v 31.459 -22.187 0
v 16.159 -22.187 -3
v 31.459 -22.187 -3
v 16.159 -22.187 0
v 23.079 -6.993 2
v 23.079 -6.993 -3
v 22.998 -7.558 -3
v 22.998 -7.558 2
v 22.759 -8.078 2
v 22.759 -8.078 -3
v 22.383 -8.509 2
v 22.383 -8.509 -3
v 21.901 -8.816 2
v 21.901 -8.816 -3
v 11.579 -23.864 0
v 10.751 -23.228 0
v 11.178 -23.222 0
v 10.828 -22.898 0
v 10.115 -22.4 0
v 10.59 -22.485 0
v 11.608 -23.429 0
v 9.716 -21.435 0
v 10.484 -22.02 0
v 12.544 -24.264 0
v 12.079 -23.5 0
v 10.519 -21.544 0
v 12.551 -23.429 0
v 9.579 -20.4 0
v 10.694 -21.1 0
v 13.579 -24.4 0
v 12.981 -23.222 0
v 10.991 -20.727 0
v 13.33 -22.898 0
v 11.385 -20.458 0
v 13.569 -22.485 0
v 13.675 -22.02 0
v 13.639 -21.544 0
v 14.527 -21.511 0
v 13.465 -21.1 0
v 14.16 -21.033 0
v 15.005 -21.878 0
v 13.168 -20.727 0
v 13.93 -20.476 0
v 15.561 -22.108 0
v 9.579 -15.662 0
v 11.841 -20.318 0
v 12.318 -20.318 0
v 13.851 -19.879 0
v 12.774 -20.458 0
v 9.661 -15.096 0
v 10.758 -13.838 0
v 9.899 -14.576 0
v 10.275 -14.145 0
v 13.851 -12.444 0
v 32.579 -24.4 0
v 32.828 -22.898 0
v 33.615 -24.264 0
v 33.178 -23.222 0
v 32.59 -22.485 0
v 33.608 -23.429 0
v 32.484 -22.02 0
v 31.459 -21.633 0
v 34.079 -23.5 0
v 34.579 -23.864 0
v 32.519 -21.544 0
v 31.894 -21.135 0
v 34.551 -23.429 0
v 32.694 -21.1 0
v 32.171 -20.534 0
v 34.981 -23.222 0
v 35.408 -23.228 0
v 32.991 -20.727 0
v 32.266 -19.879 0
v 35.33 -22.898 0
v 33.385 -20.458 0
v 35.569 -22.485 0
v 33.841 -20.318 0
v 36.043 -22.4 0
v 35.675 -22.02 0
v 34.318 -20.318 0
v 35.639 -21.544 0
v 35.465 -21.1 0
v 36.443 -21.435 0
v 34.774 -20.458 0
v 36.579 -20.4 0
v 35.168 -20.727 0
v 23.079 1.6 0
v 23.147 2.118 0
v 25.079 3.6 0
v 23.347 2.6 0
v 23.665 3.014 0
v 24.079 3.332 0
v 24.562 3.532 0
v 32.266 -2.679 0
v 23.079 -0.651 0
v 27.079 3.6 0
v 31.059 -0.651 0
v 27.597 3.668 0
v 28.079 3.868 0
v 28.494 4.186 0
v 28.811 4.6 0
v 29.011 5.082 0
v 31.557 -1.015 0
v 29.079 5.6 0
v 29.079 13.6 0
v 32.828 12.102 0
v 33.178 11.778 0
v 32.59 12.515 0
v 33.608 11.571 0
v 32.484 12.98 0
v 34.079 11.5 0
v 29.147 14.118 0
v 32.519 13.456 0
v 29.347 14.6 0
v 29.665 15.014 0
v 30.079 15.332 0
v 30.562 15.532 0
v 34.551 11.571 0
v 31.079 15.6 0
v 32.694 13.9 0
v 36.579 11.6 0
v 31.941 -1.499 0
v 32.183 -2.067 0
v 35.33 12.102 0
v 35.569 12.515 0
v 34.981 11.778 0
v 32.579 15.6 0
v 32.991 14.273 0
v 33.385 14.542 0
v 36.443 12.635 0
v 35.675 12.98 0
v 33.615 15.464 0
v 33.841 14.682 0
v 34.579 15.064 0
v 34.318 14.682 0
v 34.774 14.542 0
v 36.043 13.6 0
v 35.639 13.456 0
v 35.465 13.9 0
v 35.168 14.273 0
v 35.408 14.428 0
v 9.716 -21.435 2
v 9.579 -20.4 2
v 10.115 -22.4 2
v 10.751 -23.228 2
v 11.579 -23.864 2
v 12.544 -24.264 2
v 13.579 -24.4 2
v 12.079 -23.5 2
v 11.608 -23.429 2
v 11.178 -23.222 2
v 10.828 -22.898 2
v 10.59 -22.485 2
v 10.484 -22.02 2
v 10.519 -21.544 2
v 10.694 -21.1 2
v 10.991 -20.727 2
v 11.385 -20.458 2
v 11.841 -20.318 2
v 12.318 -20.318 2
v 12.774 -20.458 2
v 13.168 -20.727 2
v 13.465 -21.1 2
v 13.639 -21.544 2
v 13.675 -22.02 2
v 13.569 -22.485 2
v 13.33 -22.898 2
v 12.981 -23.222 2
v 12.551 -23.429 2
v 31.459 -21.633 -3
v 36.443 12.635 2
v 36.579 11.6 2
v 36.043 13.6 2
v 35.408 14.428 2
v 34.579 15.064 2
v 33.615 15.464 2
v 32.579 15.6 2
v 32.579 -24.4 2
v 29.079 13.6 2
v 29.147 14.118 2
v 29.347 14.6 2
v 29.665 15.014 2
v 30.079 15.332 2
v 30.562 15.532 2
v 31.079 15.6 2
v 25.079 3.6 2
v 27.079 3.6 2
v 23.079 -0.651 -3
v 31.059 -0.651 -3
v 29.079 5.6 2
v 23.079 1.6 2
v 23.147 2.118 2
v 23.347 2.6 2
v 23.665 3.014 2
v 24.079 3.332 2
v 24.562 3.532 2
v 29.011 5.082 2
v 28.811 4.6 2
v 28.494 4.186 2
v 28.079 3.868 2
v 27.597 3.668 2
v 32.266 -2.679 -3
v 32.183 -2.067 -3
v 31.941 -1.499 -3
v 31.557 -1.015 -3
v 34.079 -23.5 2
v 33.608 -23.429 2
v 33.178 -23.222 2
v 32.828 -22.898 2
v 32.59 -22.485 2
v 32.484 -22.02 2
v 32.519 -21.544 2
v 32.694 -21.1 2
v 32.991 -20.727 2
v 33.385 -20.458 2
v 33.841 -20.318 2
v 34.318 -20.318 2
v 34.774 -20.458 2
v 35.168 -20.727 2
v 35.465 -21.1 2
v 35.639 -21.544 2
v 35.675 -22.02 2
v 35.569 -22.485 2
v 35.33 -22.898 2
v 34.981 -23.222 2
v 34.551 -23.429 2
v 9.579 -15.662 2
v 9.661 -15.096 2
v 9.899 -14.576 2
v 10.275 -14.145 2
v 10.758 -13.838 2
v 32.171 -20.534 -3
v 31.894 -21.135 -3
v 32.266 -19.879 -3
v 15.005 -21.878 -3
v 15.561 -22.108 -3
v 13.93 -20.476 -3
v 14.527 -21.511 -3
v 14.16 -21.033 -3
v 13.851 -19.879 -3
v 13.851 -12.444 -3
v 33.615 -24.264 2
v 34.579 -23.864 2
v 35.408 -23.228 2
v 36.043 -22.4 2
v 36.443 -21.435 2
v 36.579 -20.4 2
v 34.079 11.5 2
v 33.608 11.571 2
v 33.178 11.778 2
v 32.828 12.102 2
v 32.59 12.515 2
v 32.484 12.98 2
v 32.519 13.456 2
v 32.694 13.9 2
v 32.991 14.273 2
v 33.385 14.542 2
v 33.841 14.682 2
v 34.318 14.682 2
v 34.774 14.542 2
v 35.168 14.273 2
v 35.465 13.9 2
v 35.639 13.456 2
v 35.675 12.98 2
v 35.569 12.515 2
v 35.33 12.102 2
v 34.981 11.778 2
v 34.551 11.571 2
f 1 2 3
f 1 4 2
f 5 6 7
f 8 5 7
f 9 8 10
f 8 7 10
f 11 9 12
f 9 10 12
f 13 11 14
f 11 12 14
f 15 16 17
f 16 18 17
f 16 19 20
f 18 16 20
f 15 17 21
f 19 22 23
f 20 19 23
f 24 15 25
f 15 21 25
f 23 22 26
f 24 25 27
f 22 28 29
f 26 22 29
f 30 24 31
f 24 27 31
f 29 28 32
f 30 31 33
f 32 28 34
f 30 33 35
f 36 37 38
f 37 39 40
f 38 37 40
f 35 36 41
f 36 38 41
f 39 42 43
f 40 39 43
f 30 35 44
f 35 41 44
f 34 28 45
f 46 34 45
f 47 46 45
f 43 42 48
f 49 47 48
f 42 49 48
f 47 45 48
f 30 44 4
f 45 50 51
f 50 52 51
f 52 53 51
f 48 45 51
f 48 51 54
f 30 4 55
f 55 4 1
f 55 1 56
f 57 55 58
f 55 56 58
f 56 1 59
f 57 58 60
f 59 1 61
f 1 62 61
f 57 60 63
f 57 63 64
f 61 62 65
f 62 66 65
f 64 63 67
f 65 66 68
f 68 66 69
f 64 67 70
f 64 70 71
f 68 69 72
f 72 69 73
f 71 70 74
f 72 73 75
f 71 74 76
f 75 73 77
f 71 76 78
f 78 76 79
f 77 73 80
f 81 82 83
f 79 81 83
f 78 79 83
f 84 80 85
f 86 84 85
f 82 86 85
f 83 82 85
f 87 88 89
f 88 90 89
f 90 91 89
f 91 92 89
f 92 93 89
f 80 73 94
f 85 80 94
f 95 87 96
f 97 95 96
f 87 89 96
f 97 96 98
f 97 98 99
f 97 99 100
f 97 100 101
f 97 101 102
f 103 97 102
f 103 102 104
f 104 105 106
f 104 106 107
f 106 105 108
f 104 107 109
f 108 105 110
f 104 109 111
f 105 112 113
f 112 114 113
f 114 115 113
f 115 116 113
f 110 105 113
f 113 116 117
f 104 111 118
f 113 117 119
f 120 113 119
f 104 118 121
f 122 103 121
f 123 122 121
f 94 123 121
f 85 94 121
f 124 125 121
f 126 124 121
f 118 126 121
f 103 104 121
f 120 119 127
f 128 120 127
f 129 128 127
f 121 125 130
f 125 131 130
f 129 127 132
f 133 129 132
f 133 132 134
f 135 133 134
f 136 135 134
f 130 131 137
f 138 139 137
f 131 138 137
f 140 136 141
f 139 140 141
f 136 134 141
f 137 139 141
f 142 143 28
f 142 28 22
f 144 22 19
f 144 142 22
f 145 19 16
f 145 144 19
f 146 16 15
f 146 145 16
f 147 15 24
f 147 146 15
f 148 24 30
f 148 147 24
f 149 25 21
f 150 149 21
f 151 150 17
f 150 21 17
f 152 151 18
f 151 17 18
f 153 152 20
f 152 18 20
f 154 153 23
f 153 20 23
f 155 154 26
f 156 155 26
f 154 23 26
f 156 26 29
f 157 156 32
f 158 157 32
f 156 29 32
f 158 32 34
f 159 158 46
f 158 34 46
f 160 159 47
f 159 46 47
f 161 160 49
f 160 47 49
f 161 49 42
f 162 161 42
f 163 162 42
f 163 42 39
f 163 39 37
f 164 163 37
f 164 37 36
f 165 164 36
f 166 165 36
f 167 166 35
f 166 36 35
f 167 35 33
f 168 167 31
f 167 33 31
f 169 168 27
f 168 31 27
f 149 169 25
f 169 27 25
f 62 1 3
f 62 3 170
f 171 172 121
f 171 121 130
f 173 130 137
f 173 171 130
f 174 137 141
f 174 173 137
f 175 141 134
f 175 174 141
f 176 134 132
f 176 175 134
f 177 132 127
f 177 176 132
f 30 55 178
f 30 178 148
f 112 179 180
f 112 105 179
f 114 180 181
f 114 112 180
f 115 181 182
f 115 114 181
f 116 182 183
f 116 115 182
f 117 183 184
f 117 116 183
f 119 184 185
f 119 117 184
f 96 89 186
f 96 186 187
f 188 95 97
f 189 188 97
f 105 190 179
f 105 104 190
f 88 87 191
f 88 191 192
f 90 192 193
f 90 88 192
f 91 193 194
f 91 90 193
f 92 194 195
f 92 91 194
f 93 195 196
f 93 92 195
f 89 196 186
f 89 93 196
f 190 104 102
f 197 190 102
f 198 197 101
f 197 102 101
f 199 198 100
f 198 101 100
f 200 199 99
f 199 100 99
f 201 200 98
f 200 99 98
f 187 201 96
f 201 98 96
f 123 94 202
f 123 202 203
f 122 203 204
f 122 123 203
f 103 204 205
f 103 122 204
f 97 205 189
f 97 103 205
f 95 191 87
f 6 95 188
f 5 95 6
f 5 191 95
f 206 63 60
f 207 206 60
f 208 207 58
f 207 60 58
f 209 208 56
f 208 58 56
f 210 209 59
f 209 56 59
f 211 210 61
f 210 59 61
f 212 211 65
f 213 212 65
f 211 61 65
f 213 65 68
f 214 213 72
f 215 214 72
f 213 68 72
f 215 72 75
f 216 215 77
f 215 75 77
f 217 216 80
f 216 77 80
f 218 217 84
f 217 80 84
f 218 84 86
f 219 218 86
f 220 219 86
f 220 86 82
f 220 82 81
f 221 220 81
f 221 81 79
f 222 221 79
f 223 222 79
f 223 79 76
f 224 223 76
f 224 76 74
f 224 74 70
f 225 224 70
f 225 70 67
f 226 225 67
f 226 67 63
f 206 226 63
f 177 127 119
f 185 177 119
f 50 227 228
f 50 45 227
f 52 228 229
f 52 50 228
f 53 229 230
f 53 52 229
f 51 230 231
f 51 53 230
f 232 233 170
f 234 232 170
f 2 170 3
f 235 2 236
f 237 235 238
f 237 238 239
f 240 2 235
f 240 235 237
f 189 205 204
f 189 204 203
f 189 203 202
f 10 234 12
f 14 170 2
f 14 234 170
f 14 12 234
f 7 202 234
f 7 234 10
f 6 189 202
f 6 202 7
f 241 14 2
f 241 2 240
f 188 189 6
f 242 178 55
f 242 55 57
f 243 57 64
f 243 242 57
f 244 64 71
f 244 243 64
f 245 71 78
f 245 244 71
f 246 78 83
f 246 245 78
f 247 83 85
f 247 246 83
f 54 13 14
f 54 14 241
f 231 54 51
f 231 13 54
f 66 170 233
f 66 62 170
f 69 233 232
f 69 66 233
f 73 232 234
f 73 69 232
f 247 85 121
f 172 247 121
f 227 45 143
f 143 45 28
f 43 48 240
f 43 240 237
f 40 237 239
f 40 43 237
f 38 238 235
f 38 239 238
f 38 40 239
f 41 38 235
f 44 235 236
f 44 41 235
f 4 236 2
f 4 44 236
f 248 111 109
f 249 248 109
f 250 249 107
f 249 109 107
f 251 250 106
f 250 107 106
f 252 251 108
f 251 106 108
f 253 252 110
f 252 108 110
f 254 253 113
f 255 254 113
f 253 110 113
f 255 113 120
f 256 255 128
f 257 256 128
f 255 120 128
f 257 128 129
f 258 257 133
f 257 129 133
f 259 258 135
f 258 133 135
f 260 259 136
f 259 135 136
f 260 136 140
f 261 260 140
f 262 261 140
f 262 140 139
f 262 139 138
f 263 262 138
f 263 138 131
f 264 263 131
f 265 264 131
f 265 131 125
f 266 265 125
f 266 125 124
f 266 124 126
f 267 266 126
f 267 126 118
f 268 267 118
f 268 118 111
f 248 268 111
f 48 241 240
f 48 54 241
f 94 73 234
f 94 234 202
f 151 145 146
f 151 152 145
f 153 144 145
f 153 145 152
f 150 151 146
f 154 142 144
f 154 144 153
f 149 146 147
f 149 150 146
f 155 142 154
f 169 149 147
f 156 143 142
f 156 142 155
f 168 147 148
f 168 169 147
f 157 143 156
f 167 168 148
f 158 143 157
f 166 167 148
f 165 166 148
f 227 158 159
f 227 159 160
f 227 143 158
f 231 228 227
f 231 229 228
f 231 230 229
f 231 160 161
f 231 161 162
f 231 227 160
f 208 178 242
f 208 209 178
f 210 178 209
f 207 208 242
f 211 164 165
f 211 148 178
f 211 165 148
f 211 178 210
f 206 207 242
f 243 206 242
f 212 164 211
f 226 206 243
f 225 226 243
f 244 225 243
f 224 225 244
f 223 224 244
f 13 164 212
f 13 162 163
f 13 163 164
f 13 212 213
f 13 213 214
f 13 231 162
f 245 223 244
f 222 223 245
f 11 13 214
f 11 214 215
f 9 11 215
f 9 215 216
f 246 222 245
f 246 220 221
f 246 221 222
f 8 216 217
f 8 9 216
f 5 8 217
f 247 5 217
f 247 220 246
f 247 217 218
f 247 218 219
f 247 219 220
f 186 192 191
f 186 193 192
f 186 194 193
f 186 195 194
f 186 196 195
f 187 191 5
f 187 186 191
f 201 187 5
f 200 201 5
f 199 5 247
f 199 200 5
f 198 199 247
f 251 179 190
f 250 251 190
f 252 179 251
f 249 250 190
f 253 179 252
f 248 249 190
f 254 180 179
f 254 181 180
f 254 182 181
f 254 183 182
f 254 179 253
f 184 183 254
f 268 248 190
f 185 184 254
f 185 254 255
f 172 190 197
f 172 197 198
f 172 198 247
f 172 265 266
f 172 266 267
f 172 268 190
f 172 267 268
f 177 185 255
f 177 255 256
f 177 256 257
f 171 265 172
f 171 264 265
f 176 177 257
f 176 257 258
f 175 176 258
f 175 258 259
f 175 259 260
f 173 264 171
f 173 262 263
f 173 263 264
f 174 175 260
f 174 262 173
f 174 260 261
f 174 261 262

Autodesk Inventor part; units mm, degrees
ref_plane "YZ Plane" through (0, 0, 0) normal (1, 0, 0) x (0, 1, 0)
ref_plane "XZ Plane" through (0, 0, 0) normal (0, 1, 0) x (-1, 0, 0)
ref_plane "XY Plane" through (0, 0, 0) normal (0, 0, 1) x (1, 0, 0)
ref_plane "Arbeitsebene1" through (0, 0, 0) normal (0, 0, 1) x (1, 0, 0)
sketch "Skizze1" plane through (0, 0, 0) normal (0, 0, 1) x (1, 0, 0)
  line L0 (31.9586, -24.4) -> (31.9586, -21.8494) projected
  line L1 (31.9586, -24.4) -> (35.5793, -24.4) projected
  arc A0 (35.5793, -24.4) -> (36.5793, -23.4) centre (35.5793, -23.4) ccw projected
  line L2 (36.5793, -23.4) -> (36.5793, 14.6) projected
  arc A1 (36.5793, 14.6) -> (35.5793, 15.6) centre (35.5793, 14.6) ccw projected
  line L3 (35.5793, 15.6) -> (31.5586, 15.6) projected
  line L4 (31.5586, 15.6) -> (31.5586, -0.3724) projected
  arc A2 (32.766, -2.6793) -> (31.5586, -0.3724) centre (29.9586, -2.6793) ccw projected
  line L5 (32.766, -2.6793) -> (32.766, -19.8793) projected
  arc A3 (31.9586, -21.8494) -> (32.766, -19.8793) centre (29.9586, -19.8793) ccw projected
  line L6 (20.9586, -22.6867) -> (20.9586, -24.4) projected
  line L7 (20.9586, -22.6867) -> (16.1586, -22.6867) projected
  arc A4 (13.3512, -19.8793) -> (16.1586, -22.6867) centre (16.1586, -19.8793) ccw projected
  line L8 (13.3512, -19.8793) -> (13.3512, -2.6793) projected
  arc A5 (14.5586, -0.3724) -> (13.3512, -2.6793) centre (16.1586, -2.6793) ccw projected
  line L9 (14.5586, -0.3724) -> (14.5586, 15.6) projected
  line L10 (14.5586, 15.6) -> (10.5793, 15.6) projected
  arc A6 (10.5793, 15.6) -> (9.5793, 14.6) centre (10.5793, 14.6) ccw projected
  line L11 (9.5793, 14.6) -> (9.5793, -23.4) projected
  arc A7 (9.5793, -23.4) -> (10.5793, -24.4) centre (10.5793, -23.4) ccw projected
  line L12 (10.5793, -24.4) -> (20.9586, -24.4) projected
  circle A8 centre (12.0668, 4.4966) radius 1.4 projected
  line L13 (31.5586, 15.6) -> (14.5586, 15.6)
  line L14 (31.9586, -24.4) -> (20.9586, -24.4)
  line L15 (10.5793, 15.6) -> (9.5793, 15.6)
  line L16 (9.5793, 15.6) -> (9.5793, 14.6)
  line L17 (35.5793, 15.6) -> (36.5793, 15.6)
  line L18 (36.5793, 15.6) -> (36.5793, 14.6)
  line L19 (9.5793, -23.4) -> (9.5793, -24.4)
  line L20 (9.5793, -24.4) -> (10.5793, -24.4)
  line L21 (35.5793, -24.4) -> (36.5793, -24.4)
  line L22 (36.5793, -24.4) -> (36.5793, -23.4)
extrude "Extrusion1" add sketch "Skizze1" along normal blind 2 contours L14 L6 L7 A4 L8 A5 L9 L13 L4 A2 L5 A3 L0 | L0 A3 L5 A2 L4 L3 A1 L2 A0 L1 | A0 L22 L21 | L12 A7 L11 A6 L10 L9 A5 L8 A4 L7 L6 | L20 L19 A7 | A1 L17 L18 | L16 L15 A6 | A8
ref_plane "Arbeitsebene2" through (0, 0, 0) normal (0, 0, 1) x (1, 0, 0)
sketch "Skizze2" plane through (0, 0, 2) normal (0, 0, 1) x (1, 0, 0)
  arc A0 (35.5793, -24.4) -> (36.5793, -23.4) centre (35.5793, -23.4) ccw projected
  line L0 (36.5793, -23.4) -> (36.5793, 14.6) projected
  arc A1 (36.5793, 14.6) -> (35.5793, 15.6) centre (35.5793, 14.6) ccw projected
  line L1 (35.5793, 15.6) -> (10.5793, 15.6) projected
  arc A2 (10.5793, 15.6) -> (9.5793, 14.6) centre (10.5793, 14.6) ccw projected
  line L2 (9.5793, 14.6) -> (9.5793, -23.4) projected
  arc A3 (9.5793, -23.4) -> (10.5793, -24.4) centre (10.5793, -23.4) ccw projected
  line L3 (10.5793, -24.4) -> (35.5793, -24.4) projected
  line L4 (34.0793, 13.1) -> (34.0793, -21.9)
  line L5 (34.0793, -21.9) -> (12.0793, -21.9)
  line L6 (12.0793, -21.9) -> (12.0793, 13.1)
  line L7 (12.0793, 13.1) -> (34.0793, 13.1)
  point P0 (8.0712, 15)
  point P1 (8.0712, -15)
  point P2 (38.0712, 15)
  point P3 (38.0712, -15)
  dimension "d21" = 2.5
hole "Bohrung1" at (34.0793, 13.1, 2) at (34.0793, -21.9, 2) at (12.0793, -21.9, 2) at (12.0793, 13.1, 2) direction (0, 0, -1) diameter 3.2 end through all
sketch "Skizze4" plane through (0, 0, 0) normal (0, 0, -1) x (-1, 0, 0)
  circle A0 centre (-34.0793, 13.1) radius 1.4 projected
  circle A1 centre (-34.0793, -21.9) radius 1.4 projected
  line L0 (-31.9586, -24.4) -> (-31.9586, -21.8494) projected
  line L1 (-31.9586, -24.4) -> (-35.5793, -24.4) projected
  arc A2 (-36.5793, -23.4) -> (-35.5793, -24.4) centre (-35.5793, -23.4) ccw projected
  line L2 (-36.5793, -23.4) -> (-36.5793, 14.6) projected
  arc A3 (-35.5793, 15.6) -> (-36.5793, 14.6) centre (-35.5793, 14.6) ccw projected
  line L3 (-35.5793, 15.6) -> (-31.5586, 15.6) projected
  line L4 (-31.5586, 15.6) -> (-31.5586, -0.3724) projected
  arc A4 (-31.5586, -0.3724) -> (-32.766, -2.6793) centre (-29.9586, -2.6793) ccw projected
  line L5 (-32.766, -2.6793) -> (-32.766, -19.8793) projected
  arc A5 (-32.766, -19.8793) -> (-31.9586, -21.8494) centre (-29.9586, -19.8793) ccw projected
  circle A6 centre (-12.0793, -21.9) radius 1.4 projected
  circle A7 centre (-12.0793, 13.1) radius 1.4 projected
  line L6 (-20.9586, -22.6867) -> (-20.9586, -24.4) projected
  line L7 (-20.9586, -22.6867) -> (-16.1586, -22.6867) projected
  arc A8 (-16.1586, -22.6867) -> (-13.3512, -19.8793) centre (-16.1586, -19.8793) ccw projected
  line L8 (-13.3512, -19.8793) -> (-13.3512, -2.6793) projected
  arc A9 (-13.3512, -2.6793) -> (-14.5586, -0.3724) centre (-16.1586, -2.6793) ccw projected
  line L9 (-14.5586, -0.3724) -> (-14.5586, 15.6) projected
  line L10 (-14.5586, 15.6) -> (-10.5793, 15.6) projected
  arc A10 (-9.5793, 14.6) -> (-10.5793, 15.6) centre (-10.5793, 14.6) ccw projected
  line L11 (-9.5793, 14.6) -> (-9.5793, -23.4) projected
  arc A11 (-10.5793, -24.4) -> (-9.5793, -23.4) centre (-10.5793, -23.4) ccw projected
  line L12 (-10.5793, -24.4) -> (-20.9586, -24.4) projected
  circle A12 centre (-12.0668, 4.4966) radius 1.4 projected
  line L13 (-31.0586, -0.651) -> (-31.0586, 16.1)
  line L14 (-31.0586, 16.1) -> (-35.5793, 16.1)
  arc A13 (-35.5793, 16.1) -> (-37.0793, 14.6) centre (-35.5793, 14.6) ccw
  line L15 (-37.0793, 14.6) -> (-37.0793, -23.4)
  arc A14 (-37.0793, -23.4) -> (-35.5793, -24.9) centre (-35.5793, -23.4) ccw
  line L16 (-35.5793, -24.9) -> (-31.4586, -24.9)
  line L17 (-31.4586, -24.9) -> (-31.4586, -21.6326)
  arc A15 (-32.266, -19.8793) -> (-31.4586, -21.6326) centre (-29.9586, -19.8793) ccw
  line L18 (-32.266, -19.8793) -> (-32.266, -2.6793)
  arc A16 (-31.0586, -0.651) -> (-32.266, -2.6793) centre (-29.9586, -2.6793) ccw
  line L19 (-15.0586, 16.1) -> (-15.0586, -0.651)
  arc A17 (-13.8512, -2.6793) -> (-15.0586, -0.651) centre (-16.1586, -2.6793) ccw
  line L20 (-13.8512, -2.6793) -> (-13.8512, -19.8793)
  arc A18 (-16.1586, -22.1867) -> (-13.8512, -19.8793) centre (-16.1586, -19.8793) ccw
  line L21 (-16.1586, -22.1867) -> (-21.4586, -22.1867)
  line L22 (-21.4586, -24.4607) -> (-21.4586, -24.9)
  line L23 (-21.4586, -24.9) -> (-10.5793, -24.9)
  arc A19 (-10.5793, -24.9) -> (-9.0793, -23.4) centre (-10.5793, -23.4) ccw
  line L24 (-9.0793, -23.4) -> (-9.0793, 14.6)
  arc A20 (-9.0793, 14.6) -> (-10.5793, 16.1) centre (-10.5793, 14.6) ccw
  line L25 (-10.5793, 16.1) -> (-15.0586, 16.1)
  line L26 (-31.0586, 15.6607) -> (-15.0586, 15.6607)
  line L27 (-31.4586, -24.4607) -> (-21.4586, -24.4607)
  line L28 (-15.0586, -0.651) -> (-31.0586, -0.651)
  line L29 (-20.9586, -22.6867) -> (-20.9586, -22.1867)
  line L30 (-20.9586, -22.1867) -> (-31.9586, -22.1867)
  point P0 (0, 0)
  point P1 (-31.4586, -22.1867)
  dimension "d22" = 0.5
  dimension "d23" = 0.5
extrude "Extrusion2" add sketch "Skizze4" along normal blind 3 contours L28 A17 L20 A18 L21 L30 L17 A15 L18 A16
fillet "Rundung2" radius 4 4 edges at (9.5793, 15.6, 1) (36.5793, 15.6, 1) (9.5793, -24.4, 1) (36.5793, -24.4, 1)
sketch "Skizze5" plane through (0, 0, 0) normal (0, 0, -1) x (-1, 0, 0)
  circle A0 centre (-23.0793, -4.4) radius 4.25 projected
  circle A1 centre (-12.0668, 4.4966) radius 1.4 projected
  circle A2 centre (-34.0668, 4.4966) radius 1.4 projected
  circle A3 centre (-12.0793, 13.1) radius 1.4 projected
  circle A4 centre (-34.0793, -21.9) radius 1.4 projected
  circle A5 centre (-34.0793, 13.1) radius 1.4 projected
  circle A6 centre (-12.0793, -21.9) radius 1.4 projected
  arc A7 (-29.0793, 13.6) -> (-31.0793, 15.6) centre (-31.0793, 13.6) ccw projected
  line L0 (-32.5793, 15.6) -> (-31.0793, 15.6) projected
  arc A8 (-32.5793, 15.6) -> (-36.5793, 11.6) centre (-32.5793, 11.6) ccw projected
  line L1 (-36.5793, -20.4) -> (-36.5793, 11.6) projected
  arc A9 (-36.5793, -20.4) -> (-32.5793, -24.4) centre (-32.5793, -20.4) ccw projected
  line L2 (-13.5793, -24.4) -> (-32.5793, -24.4) projected
  arc A10 (-13.5793, -24.4) -> (-9.5793, -20.4) centre (-13.5793, -20.4) ccw projected
  line L3 (-9.5793, 11.6) -> (-9.5793, -20.4) projected
  arc A11 (-9.5793, 11.6) -> (-13.5793, 15.6) centre (-13.5793, 11.6) ccw projected
  line L4 (-15.0793, 15.6) -> (-13.5793, 15.6) projected
  arc A12 (-15.0793, 15.6) -> (-17.0793, 13.6) centre (-15.0793, 13.6) ccw projected
  line L5 (-17.0793, 13.6) -> (-17.0793, 5.6) projected
  arc A13 (-19.0793, 3.6) -> (-17.0793, 5.6) centre (-19.0793, 5.6) ccw projected
  line L6 (-19.0793, 3.6) -> (-27.0793, 3.6) projected
  arc A14 (-29.0793, 5.6) -> (-27.0793, 3.6) centre (-27.0793, 5.6) ccw projected
  line L7 (-29.0793, 5.6) -> (-29.0793, 13.6) projected
  line L8 (-32.5793, 15.6) -> (-13.5793, 15.6) projected
  point P0 (0, 0)
extrude "Extrusion3" cut sketch "Skizze5" against normal blind 10 contours A7 L8 A12 L5 A13 L6 A14 L7
sketch "Skizze6" plane through (0, 0, 2) normal (0, 0, 1) x (1, 0, 0)
  line L0 (19.0793, 3.6) -> (27.0793, 3.6) projected
  line L1 (23.0793, 3.6) -> (23.0793, -8.2849)
  line L2 (23.0793, -8.2849) -> (9.5499, -14.3825)
  circle A0 centre (12.0793, 13.1) radius 1.6 projected
  circle A1 centre (34.0793, -21.9) radius 1.6 projected
  circle A2 centre (34.0793, 13.1) radius 1.6 projected
  circle A3 centre (12.0793, -21.9) radius 1.6 projected
  arc A4 (31.0793, 15.6) -> (29.0793, 13.6) centre (31.0793, 13.6) ccw projected
  line L3 (29.0793, 13.6) -> (29.0793, 5.6) projected
  arc A5 (27.0793, 3.6) -> (29.0793, 5.6) centre (27.0793, 5.6) ccw projected
  line L4 (27.0793, 3.6) -> (19.0793, 3.6) projected
  arc A6 (17.0793, 5.6) -> (19.0793, 3.6) centre (19.0793, 5.6) ccw projected
  line L5 (17.0793, 5.6) -> (17.0793, 13.6) projected
  arc A7 (17.0793, 13.6) -> (15.0793, 15.6) centre (15.0793, 13.6) ccw projected
  line L6 (15.0793, 15.6) -> (13.5793, 15.6) projected
  arc A8 (13.5793, 15.6) -> (9.5793, 11.6) centre (13.5793, 11.6) ccw projected
  line L7 (9.5793, 11.6) -> (9.5793, -20.4) projected
  arc A9 (9.5793, -20.4) -> (13.5793, -24.4) centre (13.5793, -20.4) ccw projected
  line L8 (13.5793, -24.4) -> (32.5793, -24.4) projected
  arc A10 (32.5793, -24.4) -> (36.5793, -20.4) centre (32.5793, -20.4) ccw projected
  line L9 (36.5793, -20.4) -> (36.5793, 11.6) projected
  arc A11 (36.5793, 11.6) -> (32.5793, 15.6) centre (32.5793, 11.6) ccw projected
  line L10 (32.5793, 15.6) -> (31.0793, 15.6) projected
  point P0 (0, 0)
  point P1 (9.5793, -14.3692)
extrude "Extrusion4" cut sketch "Skizze6" against normal blind 10 contours L0 L1 L2 L7 A8 L6 A7 L5 A6
fillet "Rundung3" radius 2 3 edges at (23.0793, 3.6, 1) (23.0793, -8.2849, -0.5) (9.5793, -14.3692, 1)
properties part number "00_ESP32_XIAO_Adapter_lid_a4988"
